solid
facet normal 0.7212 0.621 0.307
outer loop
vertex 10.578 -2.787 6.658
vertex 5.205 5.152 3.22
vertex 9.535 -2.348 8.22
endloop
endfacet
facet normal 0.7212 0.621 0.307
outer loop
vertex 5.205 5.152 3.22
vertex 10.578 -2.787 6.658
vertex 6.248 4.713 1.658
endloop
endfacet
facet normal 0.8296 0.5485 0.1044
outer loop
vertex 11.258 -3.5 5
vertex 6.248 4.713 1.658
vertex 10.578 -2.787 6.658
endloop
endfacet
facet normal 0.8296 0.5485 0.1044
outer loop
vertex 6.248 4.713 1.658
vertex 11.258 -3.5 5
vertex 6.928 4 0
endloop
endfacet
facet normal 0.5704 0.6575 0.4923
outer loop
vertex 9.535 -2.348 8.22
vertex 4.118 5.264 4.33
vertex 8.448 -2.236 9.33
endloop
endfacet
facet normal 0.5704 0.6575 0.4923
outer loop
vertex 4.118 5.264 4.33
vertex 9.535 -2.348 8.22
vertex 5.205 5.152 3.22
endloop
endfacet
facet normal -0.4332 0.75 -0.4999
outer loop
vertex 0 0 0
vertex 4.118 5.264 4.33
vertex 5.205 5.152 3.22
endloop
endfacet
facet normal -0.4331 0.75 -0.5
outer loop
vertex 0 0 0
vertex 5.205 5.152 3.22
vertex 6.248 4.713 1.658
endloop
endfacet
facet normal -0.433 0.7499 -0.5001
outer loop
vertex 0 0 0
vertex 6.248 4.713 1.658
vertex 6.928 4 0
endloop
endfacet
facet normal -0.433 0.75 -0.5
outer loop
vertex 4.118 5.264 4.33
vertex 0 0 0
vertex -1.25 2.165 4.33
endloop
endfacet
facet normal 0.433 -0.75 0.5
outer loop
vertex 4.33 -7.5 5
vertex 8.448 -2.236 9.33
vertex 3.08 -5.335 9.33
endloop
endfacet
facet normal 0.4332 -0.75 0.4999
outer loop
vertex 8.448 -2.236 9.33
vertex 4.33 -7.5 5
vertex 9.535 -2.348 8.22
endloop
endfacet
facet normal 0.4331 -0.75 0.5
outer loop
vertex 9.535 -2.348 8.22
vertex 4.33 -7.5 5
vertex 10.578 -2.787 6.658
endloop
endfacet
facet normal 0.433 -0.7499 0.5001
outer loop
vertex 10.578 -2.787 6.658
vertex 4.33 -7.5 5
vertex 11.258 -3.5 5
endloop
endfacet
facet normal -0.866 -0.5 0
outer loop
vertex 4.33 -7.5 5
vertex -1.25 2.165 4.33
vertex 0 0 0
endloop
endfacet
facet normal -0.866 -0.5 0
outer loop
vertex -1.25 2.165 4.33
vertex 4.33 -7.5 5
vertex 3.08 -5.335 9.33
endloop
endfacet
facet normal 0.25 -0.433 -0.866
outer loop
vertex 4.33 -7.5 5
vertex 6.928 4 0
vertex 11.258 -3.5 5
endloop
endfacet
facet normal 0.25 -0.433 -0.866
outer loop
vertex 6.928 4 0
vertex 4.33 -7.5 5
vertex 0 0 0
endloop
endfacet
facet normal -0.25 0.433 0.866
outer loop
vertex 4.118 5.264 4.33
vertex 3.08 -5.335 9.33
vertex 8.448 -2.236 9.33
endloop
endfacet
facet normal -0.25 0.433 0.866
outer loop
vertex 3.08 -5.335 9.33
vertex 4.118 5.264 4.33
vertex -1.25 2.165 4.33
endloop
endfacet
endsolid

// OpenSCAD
// Generated by generate_scads.py
rotate([60,0,30]) {
  intersection() {
    cylinder(h=30, r=8, center=false);
    cube(size=[25,25,20], center=true);
    cube(size=[20,15,20], center=false);
    cube(size=[15,5,20], center=false);
  }
}
